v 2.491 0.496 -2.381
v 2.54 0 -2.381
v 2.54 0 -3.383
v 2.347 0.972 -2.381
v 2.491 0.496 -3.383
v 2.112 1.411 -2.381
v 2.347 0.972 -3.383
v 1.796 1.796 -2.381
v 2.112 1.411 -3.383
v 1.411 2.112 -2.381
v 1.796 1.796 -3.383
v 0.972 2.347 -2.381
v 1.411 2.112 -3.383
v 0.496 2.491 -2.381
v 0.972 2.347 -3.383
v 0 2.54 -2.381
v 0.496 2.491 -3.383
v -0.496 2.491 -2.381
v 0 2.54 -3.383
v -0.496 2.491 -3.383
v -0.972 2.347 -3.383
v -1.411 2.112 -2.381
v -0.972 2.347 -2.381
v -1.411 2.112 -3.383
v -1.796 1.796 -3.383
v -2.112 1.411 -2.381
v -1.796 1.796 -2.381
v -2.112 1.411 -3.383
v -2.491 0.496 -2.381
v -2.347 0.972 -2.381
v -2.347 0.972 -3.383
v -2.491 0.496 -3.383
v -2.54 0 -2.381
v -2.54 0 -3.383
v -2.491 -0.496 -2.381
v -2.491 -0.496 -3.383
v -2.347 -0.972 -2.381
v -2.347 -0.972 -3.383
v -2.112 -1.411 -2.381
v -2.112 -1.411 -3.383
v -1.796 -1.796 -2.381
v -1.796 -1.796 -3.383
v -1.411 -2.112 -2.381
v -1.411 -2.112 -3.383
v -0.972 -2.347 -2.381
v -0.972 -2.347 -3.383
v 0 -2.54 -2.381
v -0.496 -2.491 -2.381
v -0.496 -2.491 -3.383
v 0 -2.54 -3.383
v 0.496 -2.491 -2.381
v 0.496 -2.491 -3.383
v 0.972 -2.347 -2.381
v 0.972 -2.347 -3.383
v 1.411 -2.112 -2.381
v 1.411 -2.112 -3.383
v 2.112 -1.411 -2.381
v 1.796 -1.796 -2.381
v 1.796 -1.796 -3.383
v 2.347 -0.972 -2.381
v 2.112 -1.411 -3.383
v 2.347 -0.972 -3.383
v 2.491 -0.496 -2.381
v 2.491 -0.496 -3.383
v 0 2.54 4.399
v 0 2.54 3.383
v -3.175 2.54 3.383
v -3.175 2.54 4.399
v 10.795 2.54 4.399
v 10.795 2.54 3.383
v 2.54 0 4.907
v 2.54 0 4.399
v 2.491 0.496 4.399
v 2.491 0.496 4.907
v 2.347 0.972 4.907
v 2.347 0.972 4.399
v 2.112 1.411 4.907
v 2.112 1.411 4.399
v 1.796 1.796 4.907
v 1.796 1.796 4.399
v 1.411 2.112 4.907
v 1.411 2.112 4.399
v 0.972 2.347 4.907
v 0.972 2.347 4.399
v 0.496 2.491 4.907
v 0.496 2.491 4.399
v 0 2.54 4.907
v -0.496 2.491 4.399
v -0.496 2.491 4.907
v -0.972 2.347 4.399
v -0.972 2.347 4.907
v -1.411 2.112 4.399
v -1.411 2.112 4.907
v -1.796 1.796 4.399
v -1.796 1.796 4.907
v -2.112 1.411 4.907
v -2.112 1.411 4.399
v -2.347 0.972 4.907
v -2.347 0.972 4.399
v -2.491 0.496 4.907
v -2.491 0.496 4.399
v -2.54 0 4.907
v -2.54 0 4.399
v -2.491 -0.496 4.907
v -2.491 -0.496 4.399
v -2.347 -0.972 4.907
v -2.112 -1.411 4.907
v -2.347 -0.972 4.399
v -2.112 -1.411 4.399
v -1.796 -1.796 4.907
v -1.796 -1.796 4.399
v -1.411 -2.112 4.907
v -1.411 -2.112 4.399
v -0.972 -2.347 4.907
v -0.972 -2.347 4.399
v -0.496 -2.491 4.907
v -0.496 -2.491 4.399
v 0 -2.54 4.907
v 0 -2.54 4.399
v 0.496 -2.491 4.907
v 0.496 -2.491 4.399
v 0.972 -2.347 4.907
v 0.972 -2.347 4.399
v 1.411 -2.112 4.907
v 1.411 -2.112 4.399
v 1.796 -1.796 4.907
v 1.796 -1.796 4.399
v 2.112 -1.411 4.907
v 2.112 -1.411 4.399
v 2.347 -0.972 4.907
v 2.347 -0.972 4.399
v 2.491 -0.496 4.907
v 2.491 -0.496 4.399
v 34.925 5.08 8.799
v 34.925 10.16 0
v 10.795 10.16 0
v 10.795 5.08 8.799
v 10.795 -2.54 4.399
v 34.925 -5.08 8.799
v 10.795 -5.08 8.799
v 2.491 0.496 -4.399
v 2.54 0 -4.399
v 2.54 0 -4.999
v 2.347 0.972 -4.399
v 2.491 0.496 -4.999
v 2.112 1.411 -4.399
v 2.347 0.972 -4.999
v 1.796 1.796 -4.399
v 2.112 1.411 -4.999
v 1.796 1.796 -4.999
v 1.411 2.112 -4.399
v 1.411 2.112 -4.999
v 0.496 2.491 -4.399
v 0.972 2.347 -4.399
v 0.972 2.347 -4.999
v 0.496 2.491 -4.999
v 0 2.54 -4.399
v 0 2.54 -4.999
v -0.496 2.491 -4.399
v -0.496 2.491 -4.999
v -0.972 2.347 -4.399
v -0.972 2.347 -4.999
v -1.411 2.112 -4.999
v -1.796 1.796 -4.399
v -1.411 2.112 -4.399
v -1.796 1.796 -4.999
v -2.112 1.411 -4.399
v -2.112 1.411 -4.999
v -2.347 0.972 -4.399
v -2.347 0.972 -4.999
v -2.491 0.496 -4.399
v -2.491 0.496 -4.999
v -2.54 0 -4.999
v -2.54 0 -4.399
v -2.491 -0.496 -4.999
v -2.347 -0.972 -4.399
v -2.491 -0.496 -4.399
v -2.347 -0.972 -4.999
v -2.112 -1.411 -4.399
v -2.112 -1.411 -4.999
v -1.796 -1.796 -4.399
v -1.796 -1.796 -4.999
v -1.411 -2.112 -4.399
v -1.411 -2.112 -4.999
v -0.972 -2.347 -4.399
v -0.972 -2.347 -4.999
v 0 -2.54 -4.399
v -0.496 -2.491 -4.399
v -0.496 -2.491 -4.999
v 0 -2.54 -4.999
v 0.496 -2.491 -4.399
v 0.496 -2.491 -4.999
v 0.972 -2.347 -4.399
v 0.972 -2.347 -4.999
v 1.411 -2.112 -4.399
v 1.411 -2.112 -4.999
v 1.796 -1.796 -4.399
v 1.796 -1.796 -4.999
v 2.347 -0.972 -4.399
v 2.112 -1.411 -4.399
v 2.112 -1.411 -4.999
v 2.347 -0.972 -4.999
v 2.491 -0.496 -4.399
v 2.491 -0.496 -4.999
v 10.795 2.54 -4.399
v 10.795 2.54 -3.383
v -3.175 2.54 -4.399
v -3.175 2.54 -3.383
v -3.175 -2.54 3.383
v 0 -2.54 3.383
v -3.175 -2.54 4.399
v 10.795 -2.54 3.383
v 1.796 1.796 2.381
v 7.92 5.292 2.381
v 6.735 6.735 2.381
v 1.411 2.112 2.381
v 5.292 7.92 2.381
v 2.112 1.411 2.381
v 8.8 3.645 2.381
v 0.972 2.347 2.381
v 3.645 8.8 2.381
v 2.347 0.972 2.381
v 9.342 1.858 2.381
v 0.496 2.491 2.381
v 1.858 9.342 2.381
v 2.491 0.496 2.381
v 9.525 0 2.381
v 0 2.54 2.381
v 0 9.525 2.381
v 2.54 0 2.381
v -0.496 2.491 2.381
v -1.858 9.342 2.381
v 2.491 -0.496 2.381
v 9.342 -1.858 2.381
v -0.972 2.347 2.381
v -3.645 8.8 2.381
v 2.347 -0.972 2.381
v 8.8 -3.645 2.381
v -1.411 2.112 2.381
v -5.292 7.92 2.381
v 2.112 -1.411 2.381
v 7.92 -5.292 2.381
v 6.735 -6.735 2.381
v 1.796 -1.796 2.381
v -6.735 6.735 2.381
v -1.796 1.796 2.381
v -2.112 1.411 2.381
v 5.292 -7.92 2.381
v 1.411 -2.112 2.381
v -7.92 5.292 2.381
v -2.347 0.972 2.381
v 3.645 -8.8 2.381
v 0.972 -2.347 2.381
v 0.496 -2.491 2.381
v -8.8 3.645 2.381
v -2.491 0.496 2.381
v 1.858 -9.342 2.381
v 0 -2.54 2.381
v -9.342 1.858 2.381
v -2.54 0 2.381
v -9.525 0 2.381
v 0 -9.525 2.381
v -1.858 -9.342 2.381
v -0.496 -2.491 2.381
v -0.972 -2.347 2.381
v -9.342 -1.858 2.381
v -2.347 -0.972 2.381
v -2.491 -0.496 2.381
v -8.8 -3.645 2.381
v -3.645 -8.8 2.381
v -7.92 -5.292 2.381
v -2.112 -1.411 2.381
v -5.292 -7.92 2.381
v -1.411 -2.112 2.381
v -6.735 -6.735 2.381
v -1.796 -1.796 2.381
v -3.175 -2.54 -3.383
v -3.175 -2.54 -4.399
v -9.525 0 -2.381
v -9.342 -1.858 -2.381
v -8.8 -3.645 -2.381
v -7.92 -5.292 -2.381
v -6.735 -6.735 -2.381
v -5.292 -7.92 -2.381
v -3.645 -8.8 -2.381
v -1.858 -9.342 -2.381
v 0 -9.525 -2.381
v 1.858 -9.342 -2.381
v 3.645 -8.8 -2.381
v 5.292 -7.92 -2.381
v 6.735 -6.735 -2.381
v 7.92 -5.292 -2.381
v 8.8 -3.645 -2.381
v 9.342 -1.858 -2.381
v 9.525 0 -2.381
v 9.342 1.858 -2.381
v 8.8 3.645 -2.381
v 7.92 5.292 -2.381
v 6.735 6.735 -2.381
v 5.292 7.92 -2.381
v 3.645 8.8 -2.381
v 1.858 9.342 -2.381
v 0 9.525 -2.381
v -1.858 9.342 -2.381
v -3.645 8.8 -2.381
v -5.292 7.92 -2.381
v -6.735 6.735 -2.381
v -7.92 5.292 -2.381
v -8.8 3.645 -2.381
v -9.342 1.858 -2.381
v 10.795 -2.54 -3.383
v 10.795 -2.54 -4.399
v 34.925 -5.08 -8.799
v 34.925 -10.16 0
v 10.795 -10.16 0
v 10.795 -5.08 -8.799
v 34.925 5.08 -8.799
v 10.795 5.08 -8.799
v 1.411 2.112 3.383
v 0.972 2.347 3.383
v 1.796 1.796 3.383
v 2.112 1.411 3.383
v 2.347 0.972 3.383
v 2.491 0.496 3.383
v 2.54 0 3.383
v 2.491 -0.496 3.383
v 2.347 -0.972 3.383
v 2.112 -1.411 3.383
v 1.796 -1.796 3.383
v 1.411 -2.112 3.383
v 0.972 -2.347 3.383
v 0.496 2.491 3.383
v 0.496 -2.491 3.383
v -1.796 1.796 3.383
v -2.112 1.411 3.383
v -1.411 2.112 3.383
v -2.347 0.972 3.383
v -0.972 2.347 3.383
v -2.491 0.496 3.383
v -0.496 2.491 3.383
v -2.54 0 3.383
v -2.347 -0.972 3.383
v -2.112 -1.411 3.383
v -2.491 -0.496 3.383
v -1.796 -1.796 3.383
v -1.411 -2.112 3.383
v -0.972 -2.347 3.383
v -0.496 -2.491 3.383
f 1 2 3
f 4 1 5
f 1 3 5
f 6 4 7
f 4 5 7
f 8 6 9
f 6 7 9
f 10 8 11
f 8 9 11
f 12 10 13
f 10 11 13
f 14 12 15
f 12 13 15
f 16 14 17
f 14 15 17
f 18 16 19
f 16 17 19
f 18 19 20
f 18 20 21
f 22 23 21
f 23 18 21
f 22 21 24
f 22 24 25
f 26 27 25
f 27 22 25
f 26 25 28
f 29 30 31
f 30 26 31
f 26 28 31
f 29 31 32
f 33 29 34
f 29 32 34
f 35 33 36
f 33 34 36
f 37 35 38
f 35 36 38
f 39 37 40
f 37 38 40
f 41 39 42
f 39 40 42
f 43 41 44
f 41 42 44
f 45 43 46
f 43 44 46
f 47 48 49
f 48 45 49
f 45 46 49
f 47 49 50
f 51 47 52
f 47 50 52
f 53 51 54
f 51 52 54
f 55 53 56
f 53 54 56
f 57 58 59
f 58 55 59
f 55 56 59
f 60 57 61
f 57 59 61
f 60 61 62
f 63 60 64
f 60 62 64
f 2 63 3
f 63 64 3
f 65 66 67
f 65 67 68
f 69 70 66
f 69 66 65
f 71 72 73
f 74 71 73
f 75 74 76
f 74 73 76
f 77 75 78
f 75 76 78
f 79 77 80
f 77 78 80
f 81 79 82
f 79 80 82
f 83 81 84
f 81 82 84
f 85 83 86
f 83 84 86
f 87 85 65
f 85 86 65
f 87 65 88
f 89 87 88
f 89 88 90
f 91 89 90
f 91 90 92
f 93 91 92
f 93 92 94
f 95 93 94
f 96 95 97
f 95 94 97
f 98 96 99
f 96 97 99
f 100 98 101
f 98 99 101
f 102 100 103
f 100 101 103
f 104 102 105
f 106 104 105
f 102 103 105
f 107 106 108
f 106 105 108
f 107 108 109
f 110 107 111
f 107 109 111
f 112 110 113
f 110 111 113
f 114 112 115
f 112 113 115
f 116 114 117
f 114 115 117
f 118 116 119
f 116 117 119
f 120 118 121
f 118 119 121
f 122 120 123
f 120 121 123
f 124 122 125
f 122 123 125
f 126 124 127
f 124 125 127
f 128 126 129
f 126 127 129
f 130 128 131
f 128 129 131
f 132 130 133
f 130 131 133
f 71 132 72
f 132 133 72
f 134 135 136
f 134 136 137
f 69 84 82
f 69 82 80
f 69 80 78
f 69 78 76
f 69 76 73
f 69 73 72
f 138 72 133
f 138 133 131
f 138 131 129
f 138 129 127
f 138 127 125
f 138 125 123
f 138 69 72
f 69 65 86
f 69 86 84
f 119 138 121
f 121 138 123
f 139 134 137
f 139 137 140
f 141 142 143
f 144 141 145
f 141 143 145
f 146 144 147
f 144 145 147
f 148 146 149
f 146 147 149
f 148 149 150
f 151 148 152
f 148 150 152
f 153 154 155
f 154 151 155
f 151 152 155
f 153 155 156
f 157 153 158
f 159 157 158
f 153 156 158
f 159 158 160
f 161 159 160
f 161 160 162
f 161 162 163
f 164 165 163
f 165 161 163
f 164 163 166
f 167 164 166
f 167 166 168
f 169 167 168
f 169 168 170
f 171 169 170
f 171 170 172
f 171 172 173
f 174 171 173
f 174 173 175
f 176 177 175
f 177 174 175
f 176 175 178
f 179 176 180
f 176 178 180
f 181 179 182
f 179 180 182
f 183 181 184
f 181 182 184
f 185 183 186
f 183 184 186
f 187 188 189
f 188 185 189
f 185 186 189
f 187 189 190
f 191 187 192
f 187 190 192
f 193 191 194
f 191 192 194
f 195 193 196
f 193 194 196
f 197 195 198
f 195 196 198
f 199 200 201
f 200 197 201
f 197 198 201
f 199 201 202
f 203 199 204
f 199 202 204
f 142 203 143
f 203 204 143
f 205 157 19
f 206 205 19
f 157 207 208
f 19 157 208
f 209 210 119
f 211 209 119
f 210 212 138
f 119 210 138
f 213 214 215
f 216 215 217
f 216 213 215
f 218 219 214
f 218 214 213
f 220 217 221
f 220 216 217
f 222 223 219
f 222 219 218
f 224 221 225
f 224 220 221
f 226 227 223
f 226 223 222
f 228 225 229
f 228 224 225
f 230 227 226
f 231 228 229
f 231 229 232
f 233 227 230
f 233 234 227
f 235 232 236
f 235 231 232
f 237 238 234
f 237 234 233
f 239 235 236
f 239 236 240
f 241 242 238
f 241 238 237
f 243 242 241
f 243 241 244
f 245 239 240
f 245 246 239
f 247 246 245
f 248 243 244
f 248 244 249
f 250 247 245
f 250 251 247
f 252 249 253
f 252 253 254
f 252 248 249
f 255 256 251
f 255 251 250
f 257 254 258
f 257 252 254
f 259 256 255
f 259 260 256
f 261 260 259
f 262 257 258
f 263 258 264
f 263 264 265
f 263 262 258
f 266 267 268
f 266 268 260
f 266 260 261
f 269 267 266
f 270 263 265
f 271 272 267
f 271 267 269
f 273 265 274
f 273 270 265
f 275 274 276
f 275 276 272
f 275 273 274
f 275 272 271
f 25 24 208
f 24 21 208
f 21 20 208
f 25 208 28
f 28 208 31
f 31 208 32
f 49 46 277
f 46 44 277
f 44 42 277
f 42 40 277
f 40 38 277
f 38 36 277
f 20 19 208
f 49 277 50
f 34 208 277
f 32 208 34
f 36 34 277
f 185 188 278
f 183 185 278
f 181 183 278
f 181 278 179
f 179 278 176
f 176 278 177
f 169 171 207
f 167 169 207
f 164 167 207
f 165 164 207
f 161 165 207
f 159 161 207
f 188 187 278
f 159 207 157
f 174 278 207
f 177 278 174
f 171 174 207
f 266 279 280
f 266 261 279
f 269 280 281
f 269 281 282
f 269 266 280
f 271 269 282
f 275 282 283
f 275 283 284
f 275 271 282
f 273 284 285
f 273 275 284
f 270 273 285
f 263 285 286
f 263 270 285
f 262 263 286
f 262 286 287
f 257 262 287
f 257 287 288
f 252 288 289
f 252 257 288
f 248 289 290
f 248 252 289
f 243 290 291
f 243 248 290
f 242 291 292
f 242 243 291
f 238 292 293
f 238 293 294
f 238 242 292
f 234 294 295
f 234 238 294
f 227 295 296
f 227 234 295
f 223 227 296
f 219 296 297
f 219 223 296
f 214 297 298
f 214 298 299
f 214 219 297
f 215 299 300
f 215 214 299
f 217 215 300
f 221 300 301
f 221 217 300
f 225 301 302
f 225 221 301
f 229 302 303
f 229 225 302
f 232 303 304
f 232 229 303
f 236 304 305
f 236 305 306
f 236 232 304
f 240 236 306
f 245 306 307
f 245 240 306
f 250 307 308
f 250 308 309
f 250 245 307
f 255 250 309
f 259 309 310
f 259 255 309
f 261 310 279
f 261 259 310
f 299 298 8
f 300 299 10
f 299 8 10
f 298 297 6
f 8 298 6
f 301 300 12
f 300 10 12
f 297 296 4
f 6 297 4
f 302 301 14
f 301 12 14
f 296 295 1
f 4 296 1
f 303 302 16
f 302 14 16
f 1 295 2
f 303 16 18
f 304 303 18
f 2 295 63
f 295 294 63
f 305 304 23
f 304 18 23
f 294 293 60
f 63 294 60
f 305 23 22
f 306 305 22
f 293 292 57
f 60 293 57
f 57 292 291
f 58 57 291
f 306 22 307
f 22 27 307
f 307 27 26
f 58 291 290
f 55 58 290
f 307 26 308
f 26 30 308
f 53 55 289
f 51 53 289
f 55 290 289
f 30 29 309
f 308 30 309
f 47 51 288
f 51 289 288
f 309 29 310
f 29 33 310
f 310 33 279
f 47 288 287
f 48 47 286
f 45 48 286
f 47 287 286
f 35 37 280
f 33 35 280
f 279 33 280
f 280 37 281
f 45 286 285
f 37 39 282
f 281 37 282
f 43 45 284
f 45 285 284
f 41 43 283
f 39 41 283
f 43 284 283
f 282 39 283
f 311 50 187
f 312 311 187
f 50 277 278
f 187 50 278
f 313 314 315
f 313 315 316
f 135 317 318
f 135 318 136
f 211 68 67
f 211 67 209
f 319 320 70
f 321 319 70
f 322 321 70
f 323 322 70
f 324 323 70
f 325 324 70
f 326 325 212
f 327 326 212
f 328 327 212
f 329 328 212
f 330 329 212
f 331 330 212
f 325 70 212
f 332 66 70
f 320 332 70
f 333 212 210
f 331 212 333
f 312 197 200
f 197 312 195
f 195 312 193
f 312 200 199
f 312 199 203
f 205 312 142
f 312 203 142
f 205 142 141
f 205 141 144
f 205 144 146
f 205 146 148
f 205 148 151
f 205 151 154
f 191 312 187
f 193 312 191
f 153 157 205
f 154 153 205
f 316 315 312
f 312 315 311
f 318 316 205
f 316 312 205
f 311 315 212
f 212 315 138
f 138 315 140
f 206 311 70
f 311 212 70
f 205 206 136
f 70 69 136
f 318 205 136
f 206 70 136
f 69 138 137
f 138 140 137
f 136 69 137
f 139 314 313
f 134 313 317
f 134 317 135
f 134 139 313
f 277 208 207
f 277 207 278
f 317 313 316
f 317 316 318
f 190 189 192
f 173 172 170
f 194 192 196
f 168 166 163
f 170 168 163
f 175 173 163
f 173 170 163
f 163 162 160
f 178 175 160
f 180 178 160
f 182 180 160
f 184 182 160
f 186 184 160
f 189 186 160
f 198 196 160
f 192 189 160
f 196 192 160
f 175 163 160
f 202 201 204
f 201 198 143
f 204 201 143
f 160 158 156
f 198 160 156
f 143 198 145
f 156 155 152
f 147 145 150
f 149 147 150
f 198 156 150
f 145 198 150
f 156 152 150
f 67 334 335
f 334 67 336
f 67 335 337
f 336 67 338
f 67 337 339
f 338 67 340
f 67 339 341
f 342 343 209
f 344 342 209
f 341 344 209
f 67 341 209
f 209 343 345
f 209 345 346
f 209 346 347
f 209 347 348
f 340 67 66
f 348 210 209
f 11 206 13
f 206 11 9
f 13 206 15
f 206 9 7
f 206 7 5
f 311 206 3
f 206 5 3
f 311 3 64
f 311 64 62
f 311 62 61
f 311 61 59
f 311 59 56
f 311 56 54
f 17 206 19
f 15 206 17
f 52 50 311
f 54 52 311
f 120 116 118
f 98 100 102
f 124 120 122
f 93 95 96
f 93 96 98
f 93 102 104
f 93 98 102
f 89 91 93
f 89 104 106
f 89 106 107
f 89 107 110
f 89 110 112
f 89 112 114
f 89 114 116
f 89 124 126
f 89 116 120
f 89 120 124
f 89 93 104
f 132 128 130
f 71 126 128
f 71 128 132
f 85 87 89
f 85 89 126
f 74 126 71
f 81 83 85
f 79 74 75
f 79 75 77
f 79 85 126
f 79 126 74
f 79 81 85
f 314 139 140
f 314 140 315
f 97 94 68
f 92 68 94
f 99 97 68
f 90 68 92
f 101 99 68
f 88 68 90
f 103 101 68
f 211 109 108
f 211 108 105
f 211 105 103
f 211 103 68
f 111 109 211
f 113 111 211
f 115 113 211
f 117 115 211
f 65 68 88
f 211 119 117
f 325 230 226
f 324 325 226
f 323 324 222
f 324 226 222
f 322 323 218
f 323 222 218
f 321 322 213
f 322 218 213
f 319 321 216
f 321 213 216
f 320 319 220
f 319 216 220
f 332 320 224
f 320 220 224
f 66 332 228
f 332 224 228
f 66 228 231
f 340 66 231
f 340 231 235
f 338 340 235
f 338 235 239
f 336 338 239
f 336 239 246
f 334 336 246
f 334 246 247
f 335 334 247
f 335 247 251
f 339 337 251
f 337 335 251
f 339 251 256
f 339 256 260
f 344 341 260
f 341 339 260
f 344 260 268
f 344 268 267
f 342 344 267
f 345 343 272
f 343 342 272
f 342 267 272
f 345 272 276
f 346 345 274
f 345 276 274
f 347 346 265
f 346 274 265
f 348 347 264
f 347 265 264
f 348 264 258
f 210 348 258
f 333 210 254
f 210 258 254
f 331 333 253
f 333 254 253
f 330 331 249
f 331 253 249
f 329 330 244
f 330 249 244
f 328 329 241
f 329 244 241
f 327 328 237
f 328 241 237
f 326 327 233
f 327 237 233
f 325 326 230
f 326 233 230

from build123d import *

# Parameters (mm, degrees)
SKETCH3_R                = 9.525
BOSS_EXTRUDE1_DEPTH      = 2.38125
BOSS_EXTRUDE4_DEPTH      = 25.4
SKETCH7_W                = 5.08
SKETCH7_H                = 1.016
BOSS_EXTRUDE5_DEPTH      = 12.7
CUT_EXTRUDE1_DEPTH       = 1.27
BOSS_EXTRUDE6_DEPTH      = 0.508
BOSS_EXTRUDE6_DEPTH_BACK = 9.398
SKETCH11_R               = 2.54
BOSS_EXTRUDE7_DEPTH      = 24.13


with BuildPart() as part:
    # Sketch3 → Boss-Extrude1 (new, symmetric)
    with BuildSketch(Plane(origin=(0, 0, 0), x_dir=(0, 1, 0), z_dir=(0, 0, 1))):
        with Locations(Location((0, 0, 0), (0, 0, 90))):
            Circle(SKETCH3_R)
    extrude(amount=BOSS_EXTRUDE1_DEPTH, both=True)



with BuildPart() as body_2:
    # Sketch6 → Boss-Extrude4 (new body)
    with BuildSketch(Plane.YZ.offset(9.525)):
        Polygon((-5.08, 0), (-2.54, -4.399409051), (2.54, -4.399409051), (5.08, 0), (2.54, 4.399409051), (-2.54, 4.399409051), align=None)
    extrude(amount=BOSS_EXTRUDE4_DEPTH)

    # Sketch7 → Boss-Extrude5 (add)
    with BuildSketch(Plane(origin=(9.525, 0, 0), x_dir=(0, -1, 0), z_dir=(-1, 0, 0))):
        with Locations((0, 3.891409051)):
            Rectangle(SKETCH7_W, SKETCH7_H)
        with Locations((0, -3.891409051)):
            Rectangle(SKETCH7_W, SKETCH7_H)
    extrude(amount=BOSS_EXTRUDE5_DEPTH)

    # Sketch10 → Cut-Extrude1 (cut)
    with BuildSketch(Plane(origin=(9.525, 0, 0), x_dir=(0, -1, 0), z_dir=(-1, 0, 0))):
        Polygon((-2.54, 4.399409051), (-5.08, 0), (-2.54, -4.399409051), (-2.54, -3.383409051), (2.54, -3.383409051), (2.54, -4.399409051), (5.08, 0), (2.54, 4.399409051), (2.54, 3.383409051), (-2.54, 3.383409051), align=None)
    extrude(amount=-CUT_EXTRUDE1_DEPTH, mode=Mode.SUBTRACT)


with BuildPart() as part_1:
    add(part.part)

    add(body_2.part)  # Boss-Extrude6 merges body 2
    # Sketch11 → Boss-Extrude6 (add, two sides: drawn at the far end of the back side and taken through both)
    with BuildSketch(Plane.XY.offset(4.399409051).offset(-BOSS_EXTRUDE6_DEPTH_BACK)):
        Circle(SKETCH11_R)
    extrude(amount=BOSS_EXTRUDE6_DEPTH + BOSS_EXTRUDE6_DEPTH_BACK)

    # Sketch12 → Boss-Extrude7 (add)
    with BuildSketch(Plane.YZ.offset(34.925)):
        Polygon((-10.16, 0), (-5.08, -8.798818102), (5.08, -8.798818102), (10.16, 0), (5.08, 8.798818102), (-5.08, 8.798818102), align=None)
    extrude(amount=-BOSS_EXTRUDE7_DEPTH)


solid = part_1.part
